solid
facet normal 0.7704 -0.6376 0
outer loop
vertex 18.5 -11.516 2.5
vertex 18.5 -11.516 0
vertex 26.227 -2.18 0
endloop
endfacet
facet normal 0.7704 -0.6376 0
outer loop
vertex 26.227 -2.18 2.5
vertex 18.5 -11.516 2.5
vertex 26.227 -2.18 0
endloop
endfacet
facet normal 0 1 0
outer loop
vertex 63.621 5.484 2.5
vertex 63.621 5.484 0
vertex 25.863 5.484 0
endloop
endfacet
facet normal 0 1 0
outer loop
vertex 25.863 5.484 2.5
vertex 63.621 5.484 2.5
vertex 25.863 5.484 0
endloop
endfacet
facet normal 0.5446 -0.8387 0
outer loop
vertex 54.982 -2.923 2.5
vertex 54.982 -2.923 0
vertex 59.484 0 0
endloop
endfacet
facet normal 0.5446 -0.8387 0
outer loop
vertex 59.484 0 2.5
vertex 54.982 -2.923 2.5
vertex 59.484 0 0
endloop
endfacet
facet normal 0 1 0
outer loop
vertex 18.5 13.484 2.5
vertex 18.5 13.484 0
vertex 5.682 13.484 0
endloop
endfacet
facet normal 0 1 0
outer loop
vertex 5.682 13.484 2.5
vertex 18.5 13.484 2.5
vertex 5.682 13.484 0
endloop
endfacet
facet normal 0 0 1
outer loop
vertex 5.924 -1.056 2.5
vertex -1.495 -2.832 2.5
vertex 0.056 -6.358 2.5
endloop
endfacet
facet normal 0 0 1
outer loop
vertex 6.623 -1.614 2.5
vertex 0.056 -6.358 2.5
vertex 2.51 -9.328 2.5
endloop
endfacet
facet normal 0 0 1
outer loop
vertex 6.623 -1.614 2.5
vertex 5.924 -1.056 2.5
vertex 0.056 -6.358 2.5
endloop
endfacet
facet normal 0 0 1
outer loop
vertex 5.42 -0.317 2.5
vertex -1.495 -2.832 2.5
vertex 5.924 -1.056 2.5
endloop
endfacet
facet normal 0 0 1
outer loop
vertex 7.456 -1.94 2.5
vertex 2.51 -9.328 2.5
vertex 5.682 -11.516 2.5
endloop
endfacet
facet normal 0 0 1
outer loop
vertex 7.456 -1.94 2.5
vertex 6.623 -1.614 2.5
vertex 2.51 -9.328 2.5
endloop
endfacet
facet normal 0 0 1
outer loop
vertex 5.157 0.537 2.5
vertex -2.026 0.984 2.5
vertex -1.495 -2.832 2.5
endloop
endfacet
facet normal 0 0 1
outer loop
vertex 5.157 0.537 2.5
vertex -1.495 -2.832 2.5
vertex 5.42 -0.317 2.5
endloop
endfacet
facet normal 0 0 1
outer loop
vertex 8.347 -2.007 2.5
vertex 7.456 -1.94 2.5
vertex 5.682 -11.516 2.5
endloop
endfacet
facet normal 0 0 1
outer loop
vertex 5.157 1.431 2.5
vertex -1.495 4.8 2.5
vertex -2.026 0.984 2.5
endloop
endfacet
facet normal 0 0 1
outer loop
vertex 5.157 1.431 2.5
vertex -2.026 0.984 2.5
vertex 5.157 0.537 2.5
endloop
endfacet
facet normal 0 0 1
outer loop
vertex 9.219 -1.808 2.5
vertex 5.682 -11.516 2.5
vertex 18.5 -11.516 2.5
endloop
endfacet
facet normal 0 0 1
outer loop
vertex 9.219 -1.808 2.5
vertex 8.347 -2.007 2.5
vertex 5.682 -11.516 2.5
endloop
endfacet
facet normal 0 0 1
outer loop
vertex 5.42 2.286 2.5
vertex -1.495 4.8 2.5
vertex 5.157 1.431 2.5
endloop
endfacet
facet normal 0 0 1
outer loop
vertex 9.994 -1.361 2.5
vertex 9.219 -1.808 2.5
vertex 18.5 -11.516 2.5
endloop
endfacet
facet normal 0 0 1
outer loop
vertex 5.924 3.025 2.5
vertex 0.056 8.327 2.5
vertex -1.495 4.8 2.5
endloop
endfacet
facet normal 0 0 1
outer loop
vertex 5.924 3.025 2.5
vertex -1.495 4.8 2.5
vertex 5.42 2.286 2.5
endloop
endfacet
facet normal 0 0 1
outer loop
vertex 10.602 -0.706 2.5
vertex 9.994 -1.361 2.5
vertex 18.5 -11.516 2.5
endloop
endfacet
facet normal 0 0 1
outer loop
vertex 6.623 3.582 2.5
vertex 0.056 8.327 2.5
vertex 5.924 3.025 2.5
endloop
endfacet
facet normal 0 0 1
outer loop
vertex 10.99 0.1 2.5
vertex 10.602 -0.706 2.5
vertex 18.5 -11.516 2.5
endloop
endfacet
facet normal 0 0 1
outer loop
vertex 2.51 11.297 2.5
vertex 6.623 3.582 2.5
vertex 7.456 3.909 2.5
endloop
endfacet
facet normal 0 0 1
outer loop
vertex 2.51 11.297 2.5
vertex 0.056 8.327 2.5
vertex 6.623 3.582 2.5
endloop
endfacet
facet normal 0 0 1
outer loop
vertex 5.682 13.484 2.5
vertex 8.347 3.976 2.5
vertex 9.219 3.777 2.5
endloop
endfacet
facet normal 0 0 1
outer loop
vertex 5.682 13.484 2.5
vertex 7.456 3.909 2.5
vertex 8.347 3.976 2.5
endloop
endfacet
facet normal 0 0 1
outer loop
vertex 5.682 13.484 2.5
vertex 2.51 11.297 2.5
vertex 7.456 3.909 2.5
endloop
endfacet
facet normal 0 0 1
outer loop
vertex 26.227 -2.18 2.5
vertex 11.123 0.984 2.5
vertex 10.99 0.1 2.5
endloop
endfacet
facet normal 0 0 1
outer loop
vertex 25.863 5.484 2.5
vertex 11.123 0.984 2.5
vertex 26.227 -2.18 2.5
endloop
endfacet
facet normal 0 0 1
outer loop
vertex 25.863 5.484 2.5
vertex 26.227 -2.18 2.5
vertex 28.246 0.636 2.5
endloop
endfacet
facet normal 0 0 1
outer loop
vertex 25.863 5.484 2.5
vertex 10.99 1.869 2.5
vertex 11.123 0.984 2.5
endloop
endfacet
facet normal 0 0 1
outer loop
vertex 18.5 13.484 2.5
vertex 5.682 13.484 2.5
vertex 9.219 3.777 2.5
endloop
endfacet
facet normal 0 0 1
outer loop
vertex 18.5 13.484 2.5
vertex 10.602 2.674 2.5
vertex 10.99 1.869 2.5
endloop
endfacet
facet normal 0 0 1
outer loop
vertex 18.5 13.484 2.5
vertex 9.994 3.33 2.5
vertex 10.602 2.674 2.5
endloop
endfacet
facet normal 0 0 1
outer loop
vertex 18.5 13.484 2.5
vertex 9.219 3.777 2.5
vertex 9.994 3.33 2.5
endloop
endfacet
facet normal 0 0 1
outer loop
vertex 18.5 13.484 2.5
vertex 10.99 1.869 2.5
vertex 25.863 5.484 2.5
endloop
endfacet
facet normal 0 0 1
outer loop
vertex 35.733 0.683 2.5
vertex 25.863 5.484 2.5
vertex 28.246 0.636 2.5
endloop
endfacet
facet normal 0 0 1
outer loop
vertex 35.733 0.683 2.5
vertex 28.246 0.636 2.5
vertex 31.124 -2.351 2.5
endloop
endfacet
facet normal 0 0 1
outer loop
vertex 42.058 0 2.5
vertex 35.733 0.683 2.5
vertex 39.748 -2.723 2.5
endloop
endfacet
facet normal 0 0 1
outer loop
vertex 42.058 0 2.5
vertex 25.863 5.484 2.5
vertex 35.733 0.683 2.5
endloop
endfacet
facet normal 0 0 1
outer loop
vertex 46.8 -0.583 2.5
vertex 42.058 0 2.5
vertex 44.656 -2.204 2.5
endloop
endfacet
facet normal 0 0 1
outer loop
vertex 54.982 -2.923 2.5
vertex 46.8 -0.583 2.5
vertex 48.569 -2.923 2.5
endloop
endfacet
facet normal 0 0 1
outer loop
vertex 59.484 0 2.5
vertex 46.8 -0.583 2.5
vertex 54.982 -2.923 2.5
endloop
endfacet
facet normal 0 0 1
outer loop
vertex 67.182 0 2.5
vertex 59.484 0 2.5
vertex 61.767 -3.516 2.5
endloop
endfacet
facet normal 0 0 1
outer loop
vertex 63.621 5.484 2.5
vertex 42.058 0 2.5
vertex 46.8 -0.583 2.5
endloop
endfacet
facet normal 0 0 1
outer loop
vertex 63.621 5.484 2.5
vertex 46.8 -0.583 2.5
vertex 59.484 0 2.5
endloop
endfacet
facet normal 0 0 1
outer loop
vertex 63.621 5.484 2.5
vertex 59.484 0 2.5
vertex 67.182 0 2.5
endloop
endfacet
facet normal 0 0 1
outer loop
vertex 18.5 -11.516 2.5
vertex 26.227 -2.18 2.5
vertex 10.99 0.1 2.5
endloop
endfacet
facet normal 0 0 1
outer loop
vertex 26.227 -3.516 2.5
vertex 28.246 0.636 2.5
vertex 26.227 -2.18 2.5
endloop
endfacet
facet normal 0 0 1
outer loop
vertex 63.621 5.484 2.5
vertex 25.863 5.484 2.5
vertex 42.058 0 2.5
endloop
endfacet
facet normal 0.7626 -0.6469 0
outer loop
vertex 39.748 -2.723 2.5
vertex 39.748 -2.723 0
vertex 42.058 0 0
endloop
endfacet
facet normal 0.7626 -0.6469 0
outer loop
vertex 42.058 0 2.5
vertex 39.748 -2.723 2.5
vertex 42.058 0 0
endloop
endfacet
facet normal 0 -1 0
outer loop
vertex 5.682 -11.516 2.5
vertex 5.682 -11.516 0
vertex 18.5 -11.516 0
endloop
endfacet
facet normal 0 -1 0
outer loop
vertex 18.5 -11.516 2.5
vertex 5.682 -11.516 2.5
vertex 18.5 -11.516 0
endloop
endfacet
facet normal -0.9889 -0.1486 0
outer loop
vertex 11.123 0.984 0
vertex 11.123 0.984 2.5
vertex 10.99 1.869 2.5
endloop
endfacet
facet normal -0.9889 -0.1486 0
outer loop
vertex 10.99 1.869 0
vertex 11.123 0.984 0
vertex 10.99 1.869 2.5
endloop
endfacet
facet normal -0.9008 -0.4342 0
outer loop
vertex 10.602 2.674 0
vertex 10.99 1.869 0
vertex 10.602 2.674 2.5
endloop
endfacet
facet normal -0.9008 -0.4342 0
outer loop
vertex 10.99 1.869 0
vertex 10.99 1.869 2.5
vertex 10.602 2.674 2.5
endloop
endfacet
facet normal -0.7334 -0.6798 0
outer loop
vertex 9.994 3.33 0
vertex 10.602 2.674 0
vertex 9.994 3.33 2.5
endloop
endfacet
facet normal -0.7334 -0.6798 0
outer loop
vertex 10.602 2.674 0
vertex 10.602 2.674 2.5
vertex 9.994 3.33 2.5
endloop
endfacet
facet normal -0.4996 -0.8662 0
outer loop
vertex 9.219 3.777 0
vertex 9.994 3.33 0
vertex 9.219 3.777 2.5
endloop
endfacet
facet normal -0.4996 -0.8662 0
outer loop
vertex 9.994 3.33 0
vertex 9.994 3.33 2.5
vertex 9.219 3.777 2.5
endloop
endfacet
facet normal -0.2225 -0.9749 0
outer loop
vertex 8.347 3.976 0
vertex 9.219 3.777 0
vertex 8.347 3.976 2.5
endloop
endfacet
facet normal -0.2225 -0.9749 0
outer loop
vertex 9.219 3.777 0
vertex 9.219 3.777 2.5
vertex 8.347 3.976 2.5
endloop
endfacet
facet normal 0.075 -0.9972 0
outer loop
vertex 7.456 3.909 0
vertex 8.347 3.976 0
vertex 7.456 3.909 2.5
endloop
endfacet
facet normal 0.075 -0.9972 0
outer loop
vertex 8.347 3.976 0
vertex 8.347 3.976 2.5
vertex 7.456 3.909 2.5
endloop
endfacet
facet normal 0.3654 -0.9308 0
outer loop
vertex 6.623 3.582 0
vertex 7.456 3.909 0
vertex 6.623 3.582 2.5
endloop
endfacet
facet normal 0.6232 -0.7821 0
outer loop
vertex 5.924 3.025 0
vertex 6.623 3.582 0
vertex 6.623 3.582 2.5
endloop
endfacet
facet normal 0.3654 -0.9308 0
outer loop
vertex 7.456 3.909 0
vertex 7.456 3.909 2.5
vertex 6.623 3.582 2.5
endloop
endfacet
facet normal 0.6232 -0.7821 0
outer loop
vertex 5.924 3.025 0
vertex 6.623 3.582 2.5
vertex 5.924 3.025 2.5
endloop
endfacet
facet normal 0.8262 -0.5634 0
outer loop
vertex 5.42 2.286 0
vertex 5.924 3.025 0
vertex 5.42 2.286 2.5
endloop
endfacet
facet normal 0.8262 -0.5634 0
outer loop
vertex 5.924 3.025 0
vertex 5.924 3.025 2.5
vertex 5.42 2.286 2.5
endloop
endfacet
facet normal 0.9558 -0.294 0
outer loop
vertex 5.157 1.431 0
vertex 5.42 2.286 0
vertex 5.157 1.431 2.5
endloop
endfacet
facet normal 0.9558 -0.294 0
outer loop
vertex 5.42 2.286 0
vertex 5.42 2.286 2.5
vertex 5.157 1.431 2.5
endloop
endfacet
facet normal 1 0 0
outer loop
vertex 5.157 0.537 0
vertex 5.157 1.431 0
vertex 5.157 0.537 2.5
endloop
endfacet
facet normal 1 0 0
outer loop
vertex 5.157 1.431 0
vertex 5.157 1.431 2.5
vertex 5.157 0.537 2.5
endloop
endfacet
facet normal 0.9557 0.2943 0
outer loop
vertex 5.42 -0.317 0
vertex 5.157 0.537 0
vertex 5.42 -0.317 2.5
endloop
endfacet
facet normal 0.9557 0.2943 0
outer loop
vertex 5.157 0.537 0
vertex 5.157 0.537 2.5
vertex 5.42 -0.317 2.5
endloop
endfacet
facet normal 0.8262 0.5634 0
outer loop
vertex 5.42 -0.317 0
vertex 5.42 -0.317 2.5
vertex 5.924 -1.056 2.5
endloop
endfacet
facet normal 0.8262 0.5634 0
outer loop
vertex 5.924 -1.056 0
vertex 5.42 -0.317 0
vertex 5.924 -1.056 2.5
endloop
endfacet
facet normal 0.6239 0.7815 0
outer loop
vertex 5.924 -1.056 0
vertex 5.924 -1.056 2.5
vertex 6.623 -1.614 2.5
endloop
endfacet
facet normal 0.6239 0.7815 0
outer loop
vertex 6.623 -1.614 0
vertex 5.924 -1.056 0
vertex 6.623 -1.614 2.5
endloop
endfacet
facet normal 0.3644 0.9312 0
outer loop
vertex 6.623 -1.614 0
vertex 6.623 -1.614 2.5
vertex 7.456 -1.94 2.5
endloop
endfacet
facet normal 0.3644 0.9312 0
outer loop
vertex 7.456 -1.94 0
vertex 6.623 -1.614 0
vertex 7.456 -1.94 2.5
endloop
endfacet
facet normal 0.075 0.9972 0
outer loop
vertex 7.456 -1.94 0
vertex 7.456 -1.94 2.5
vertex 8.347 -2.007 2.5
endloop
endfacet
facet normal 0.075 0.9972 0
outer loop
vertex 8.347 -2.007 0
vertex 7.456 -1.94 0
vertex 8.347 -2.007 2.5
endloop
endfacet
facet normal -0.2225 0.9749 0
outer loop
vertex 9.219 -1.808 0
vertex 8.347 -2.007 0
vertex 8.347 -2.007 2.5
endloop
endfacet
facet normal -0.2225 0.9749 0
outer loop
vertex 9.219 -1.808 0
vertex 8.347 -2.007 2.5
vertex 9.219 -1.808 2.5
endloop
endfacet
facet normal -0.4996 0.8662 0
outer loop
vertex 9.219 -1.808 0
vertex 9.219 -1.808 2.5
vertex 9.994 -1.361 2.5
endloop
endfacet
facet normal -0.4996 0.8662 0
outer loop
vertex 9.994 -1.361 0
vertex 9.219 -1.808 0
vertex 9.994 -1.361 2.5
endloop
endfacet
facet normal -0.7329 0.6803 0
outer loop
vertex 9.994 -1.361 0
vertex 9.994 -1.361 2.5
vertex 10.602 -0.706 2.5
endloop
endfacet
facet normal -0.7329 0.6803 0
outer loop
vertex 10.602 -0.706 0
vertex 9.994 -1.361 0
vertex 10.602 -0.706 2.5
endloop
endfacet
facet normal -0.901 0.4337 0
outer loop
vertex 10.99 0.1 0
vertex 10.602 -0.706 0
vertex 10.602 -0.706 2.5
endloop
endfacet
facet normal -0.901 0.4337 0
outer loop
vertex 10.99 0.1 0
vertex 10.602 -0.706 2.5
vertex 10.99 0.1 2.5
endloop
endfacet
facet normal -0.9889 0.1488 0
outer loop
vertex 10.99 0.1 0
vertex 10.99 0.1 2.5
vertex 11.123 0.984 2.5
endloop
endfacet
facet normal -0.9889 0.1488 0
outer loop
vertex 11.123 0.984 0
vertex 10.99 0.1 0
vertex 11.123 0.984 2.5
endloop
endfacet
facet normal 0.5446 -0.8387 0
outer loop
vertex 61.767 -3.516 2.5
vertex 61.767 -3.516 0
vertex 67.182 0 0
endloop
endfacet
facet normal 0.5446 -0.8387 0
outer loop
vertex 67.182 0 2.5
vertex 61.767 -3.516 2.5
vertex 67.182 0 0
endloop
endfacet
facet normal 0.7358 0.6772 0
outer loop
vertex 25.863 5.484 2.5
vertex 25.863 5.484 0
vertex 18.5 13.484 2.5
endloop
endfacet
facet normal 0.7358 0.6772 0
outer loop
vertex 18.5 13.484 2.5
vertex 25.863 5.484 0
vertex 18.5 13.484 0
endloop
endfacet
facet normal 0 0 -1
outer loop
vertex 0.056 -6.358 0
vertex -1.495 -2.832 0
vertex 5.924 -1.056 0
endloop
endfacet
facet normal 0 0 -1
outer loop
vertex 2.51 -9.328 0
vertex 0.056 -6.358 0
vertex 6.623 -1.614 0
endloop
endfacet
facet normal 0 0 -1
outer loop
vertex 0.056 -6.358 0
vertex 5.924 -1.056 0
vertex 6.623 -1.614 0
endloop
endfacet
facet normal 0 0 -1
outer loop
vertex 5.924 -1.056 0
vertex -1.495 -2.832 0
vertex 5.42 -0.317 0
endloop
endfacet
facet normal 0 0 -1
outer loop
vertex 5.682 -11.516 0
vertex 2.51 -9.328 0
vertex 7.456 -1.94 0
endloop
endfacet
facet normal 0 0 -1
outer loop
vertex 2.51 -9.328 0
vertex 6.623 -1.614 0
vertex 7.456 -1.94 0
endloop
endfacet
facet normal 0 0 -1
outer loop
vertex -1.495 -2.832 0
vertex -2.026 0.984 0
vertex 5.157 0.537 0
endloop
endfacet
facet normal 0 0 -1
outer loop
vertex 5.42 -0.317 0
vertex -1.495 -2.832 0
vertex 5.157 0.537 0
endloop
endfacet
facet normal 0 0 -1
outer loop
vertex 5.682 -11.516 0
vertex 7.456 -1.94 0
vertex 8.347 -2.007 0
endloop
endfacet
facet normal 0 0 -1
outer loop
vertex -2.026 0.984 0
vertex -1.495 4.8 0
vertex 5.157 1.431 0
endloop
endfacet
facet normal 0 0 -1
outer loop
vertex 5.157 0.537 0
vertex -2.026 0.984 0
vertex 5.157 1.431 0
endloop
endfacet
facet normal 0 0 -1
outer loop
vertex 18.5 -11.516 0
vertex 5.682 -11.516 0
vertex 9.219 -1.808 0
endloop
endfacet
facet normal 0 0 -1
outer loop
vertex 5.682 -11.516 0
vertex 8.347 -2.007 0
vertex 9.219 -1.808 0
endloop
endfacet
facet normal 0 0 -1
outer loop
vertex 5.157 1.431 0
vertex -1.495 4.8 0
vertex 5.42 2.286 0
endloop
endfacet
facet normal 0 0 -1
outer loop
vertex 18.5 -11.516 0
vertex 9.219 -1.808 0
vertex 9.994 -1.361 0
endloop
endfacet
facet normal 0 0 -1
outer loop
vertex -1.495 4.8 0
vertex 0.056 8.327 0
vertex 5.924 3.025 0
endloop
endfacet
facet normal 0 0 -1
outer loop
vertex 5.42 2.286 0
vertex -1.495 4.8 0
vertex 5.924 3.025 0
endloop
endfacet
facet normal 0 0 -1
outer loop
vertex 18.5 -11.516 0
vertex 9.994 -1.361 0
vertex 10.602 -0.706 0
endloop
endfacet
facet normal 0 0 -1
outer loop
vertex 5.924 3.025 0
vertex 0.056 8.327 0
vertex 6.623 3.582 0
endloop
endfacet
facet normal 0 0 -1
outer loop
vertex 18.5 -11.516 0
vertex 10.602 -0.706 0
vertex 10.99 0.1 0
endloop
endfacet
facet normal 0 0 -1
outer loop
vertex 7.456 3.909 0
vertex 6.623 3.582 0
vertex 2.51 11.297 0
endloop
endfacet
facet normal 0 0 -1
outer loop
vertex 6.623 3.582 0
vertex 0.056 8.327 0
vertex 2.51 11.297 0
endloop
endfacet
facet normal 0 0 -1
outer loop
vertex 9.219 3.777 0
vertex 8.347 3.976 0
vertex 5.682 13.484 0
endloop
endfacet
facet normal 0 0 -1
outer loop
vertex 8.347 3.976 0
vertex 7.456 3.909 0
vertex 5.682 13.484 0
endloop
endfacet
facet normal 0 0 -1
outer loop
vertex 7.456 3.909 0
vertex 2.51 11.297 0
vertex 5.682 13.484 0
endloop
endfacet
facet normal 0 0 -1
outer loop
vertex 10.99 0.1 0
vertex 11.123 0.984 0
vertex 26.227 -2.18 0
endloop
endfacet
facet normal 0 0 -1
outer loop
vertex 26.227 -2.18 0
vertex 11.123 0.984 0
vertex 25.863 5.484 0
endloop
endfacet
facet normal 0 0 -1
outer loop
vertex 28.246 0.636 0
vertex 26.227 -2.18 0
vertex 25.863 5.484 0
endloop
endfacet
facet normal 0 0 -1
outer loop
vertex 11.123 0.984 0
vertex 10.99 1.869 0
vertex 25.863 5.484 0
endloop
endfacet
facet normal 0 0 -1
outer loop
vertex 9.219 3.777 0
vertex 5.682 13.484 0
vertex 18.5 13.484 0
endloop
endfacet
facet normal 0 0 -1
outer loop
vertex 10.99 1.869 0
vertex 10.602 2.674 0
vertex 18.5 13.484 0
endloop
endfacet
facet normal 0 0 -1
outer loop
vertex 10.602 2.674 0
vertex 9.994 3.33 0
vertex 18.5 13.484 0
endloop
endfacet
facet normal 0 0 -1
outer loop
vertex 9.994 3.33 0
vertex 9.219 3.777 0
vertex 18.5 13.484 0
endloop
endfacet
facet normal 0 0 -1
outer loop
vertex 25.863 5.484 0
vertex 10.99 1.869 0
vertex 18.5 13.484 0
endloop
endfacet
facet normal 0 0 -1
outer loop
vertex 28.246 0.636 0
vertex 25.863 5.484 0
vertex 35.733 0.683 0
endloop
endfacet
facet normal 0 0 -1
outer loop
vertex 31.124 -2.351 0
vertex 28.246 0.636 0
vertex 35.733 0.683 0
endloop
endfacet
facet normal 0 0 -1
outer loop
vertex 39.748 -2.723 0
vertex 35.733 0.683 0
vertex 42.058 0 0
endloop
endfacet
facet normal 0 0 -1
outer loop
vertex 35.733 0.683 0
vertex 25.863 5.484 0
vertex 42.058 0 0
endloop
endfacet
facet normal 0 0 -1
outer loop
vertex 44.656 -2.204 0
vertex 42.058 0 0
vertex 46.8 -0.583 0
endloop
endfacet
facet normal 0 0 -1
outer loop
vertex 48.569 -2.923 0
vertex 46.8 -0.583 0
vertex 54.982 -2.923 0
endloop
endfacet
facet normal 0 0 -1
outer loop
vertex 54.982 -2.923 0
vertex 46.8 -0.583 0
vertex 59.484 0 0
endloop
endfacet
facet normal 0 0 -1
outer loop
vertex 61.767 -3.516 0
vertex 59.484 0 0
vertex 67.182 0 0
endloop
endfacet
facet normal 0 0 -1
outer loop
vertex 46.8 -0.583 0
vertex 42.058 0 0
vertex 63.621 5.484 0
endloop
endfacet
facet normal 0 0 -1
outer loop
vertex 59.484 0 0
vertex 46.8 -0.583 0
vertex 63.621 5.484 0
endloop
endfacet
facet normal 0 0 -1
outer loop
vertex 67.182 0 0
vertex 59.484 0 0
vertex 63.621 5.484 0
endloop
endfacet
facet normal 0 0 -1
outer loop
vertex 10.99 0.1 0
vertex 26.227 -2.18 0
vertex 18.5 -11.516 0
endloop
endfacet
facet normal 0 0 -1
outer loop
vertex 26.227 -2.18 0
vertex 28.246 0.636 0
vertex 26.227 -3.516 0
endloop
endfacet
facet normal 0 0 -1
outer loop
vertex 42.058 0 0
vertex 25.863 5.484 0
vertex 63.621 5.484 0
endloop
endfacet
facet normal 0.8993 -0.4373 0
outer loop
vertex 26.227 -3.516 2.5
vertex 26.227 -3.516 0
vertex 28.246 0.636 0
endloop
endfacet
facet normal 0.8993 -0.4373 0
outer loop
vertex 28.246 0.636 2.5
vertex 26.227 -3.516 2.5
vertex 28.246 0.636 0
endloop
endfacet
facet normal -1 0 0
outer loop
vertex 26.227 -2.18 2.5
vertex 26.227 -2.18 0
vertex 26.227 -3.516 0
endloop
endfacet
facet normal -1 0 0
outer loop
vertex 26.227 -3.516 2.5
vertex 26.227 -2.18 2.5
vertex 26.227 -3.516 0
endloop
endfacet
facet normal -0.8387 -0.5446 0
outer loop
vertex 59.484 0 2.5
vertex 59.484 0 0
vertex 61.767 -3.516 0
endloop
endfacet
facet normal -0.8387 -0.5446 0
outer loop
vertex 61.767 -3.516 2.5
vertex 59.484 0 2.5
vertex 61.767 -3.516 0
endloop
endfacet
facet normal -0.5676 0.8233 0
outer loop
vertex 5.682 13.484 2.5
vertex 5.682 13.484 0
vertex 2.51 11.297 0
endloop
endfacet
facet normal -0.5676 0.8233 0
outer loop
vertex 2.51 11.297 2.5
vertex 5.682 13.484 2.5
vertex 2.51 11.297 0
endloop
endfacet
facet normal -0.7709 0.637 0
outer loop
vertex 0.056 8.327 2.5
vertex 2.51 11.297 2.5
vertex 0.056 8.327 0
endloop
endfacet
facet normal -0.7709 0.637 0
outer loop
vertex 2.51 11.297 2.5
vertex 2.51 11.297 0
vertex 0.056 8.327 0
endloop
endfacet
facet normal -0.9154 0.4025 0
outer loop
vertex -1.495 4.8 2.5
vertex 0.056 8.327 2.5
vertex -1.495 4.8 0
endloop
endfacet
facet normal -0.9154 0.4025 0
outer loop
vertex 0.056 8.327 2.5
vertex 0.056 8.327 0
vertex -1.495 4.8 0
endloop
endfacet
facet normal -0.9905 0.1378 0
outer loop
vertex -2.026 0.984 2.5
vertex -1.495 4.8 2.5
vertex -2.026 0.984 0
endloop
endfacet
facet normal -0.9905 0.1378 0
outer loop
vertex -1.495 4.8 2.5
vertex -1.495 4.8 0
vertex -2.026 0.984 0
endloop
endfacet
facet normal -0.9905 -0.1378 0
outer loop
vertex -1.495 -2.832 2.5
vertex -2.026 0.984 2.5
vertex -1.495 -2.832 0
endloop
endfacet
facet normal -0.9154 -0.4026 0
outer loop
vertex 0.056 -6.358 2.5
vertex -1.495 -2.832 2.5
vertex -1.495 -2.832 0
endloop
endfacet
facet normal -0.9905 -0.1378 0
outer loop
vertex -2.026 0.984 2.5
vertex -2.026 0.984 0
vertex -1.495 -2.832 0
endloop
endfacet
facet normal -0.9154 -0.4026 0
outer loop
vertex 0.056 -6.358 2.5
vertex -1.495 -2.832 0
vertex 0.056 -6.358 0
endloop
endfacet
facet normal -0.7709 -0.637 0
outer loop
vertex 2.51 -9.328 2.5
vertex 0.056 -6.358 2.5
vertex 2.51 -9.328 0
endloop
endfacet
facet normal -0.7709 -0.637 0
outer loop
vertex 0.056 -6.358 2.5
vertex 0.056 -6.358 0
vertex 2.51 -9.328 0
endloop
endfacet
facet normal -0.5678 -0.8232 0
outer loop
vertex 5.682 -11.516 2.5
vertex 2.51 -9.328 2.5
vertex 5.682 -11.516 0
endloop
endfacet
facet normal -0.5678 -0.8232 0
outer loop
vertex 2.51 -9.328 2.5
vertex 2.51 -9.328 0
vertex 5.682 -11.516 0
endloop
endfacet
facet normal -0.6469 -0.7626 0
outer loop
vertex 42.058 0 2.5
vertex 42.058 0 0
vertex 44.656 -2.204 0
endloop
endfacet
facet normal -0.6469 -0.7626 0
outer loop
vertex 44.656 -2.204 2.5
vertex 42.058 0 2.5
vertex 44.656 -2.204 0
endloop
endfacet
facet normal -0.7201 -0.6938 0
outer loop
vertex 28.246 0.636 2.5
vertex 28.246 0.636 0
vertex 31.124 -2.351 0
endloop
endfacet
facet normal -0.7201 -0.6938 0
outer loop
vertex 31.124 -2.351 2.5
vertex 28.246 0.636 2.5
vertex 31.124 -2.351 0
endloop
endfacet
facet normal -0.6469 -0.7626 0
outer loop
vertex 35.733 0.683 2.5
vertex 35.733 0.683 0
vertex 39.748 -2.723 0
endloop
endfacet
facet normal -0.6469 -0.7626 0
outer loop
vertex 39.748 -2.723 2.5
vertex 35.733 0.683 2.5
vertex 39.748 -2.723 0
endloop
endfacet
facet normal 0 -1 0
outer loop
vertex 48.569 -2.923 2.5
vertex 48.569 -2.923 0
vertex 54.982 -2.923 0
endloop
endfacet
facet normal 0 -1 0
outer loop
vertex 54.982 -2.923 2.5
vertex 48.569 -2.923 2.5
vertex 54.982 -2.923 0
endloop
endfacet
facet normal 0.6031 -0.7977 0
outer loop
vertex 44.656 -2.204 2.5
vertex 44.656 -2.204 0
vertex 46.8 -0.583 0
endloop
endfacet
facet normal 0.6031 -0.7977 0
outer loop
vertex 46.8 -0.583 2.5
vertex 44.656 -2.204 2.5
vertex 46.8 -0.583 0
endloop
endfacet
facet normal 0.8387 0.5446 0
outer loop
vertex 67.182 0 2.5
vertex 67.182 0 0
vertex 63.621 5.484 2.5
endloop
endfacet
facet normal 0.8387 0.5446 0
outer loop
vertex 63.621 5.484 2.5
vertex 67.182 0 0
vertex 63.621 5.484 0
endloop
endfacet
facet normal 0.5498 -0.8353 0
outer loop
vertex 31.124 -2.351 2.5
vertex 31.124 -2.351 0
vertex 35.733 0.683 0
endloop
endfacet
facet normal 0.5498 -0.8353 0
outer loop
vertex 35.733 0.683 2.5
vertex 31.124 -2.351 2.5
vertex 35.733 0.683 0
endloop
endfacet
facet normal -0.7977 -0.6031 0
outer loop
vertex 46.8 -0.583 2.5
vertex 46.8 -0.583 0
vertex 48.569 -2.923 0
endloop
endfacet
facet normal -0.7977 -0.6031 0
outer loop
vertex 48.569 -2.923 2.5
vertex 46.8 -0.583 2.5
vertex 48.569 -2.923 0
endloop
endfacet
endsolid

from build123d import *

# Parameters (mm, degrees)
F1_DEPTH = 2.5
F2_R     = 3
F3_DEPTH = 25


with BuildPart() as f1:
    # F0 (on Top) → F1 (new body)
    with BuildSketch(Plane.XY):
        with BuildLine():
            Line((18.500206, 13.484339), (5.681507, 13.484339))
            ThreePointArc((5.681507, 13.484339), (-2.025628, 0.984339), (5.681507, -11.515661))
            Line((5.681507, -11.515661), (18.500206, -11.515661))
            Line((18.500206, -11.515661), (26.226566, -2.179502))
            Line((26.226566, -2.179502), (26.226566, -3.515661))
            Line((26.226566, -3.515661), (28.245927, 0.636009))
            Line((28.245927, 0.636009), (31.124004, -2.351236))
            Line((31.124004, -2.351236), (35.732787, 0.682989))
            Line((35.732787, 0.682989), (39.747892, -2.72324))
            Line((39.747892, -2.72324), (42.058162, 0))
            Line((42.058162, 0), (44.656219, -2.204071))
            Line((44.656219, -2.204071), (46.799748, -0.583421))
            Line((46.799748, -0.583421), (48.568681, -2.923074))
            Line((48.568681, -2.923074), (54.981848, -2.923074))
            Line((54.981848, -2.923074), (59.484062, 0))
            Line((59.484062, 0), (61.766614, -3.515661))
            Line((61.766614, -3.515661), (67.18155, 0))
            Line((67.18155, 0), (63.620829, 5.484339))
            Line((63.620829, 5.484339), (25.8629, 5.484339))
            Line((25.8629, 5.484339), (18.500206, 13.484339))
        make_face()
    extrude(amount=F1_DEPTH)

    # F2 (on face) → F3 (cut)
    with BuildSketch(Plane.XY.offset(2.5)):
        with Locations((8.123178, 0.984339)):
            Circle(F2_R)
    extrude(amount=-F3_DEPTH, mode=Mode.SUBTRACT)


solid = f1.part
